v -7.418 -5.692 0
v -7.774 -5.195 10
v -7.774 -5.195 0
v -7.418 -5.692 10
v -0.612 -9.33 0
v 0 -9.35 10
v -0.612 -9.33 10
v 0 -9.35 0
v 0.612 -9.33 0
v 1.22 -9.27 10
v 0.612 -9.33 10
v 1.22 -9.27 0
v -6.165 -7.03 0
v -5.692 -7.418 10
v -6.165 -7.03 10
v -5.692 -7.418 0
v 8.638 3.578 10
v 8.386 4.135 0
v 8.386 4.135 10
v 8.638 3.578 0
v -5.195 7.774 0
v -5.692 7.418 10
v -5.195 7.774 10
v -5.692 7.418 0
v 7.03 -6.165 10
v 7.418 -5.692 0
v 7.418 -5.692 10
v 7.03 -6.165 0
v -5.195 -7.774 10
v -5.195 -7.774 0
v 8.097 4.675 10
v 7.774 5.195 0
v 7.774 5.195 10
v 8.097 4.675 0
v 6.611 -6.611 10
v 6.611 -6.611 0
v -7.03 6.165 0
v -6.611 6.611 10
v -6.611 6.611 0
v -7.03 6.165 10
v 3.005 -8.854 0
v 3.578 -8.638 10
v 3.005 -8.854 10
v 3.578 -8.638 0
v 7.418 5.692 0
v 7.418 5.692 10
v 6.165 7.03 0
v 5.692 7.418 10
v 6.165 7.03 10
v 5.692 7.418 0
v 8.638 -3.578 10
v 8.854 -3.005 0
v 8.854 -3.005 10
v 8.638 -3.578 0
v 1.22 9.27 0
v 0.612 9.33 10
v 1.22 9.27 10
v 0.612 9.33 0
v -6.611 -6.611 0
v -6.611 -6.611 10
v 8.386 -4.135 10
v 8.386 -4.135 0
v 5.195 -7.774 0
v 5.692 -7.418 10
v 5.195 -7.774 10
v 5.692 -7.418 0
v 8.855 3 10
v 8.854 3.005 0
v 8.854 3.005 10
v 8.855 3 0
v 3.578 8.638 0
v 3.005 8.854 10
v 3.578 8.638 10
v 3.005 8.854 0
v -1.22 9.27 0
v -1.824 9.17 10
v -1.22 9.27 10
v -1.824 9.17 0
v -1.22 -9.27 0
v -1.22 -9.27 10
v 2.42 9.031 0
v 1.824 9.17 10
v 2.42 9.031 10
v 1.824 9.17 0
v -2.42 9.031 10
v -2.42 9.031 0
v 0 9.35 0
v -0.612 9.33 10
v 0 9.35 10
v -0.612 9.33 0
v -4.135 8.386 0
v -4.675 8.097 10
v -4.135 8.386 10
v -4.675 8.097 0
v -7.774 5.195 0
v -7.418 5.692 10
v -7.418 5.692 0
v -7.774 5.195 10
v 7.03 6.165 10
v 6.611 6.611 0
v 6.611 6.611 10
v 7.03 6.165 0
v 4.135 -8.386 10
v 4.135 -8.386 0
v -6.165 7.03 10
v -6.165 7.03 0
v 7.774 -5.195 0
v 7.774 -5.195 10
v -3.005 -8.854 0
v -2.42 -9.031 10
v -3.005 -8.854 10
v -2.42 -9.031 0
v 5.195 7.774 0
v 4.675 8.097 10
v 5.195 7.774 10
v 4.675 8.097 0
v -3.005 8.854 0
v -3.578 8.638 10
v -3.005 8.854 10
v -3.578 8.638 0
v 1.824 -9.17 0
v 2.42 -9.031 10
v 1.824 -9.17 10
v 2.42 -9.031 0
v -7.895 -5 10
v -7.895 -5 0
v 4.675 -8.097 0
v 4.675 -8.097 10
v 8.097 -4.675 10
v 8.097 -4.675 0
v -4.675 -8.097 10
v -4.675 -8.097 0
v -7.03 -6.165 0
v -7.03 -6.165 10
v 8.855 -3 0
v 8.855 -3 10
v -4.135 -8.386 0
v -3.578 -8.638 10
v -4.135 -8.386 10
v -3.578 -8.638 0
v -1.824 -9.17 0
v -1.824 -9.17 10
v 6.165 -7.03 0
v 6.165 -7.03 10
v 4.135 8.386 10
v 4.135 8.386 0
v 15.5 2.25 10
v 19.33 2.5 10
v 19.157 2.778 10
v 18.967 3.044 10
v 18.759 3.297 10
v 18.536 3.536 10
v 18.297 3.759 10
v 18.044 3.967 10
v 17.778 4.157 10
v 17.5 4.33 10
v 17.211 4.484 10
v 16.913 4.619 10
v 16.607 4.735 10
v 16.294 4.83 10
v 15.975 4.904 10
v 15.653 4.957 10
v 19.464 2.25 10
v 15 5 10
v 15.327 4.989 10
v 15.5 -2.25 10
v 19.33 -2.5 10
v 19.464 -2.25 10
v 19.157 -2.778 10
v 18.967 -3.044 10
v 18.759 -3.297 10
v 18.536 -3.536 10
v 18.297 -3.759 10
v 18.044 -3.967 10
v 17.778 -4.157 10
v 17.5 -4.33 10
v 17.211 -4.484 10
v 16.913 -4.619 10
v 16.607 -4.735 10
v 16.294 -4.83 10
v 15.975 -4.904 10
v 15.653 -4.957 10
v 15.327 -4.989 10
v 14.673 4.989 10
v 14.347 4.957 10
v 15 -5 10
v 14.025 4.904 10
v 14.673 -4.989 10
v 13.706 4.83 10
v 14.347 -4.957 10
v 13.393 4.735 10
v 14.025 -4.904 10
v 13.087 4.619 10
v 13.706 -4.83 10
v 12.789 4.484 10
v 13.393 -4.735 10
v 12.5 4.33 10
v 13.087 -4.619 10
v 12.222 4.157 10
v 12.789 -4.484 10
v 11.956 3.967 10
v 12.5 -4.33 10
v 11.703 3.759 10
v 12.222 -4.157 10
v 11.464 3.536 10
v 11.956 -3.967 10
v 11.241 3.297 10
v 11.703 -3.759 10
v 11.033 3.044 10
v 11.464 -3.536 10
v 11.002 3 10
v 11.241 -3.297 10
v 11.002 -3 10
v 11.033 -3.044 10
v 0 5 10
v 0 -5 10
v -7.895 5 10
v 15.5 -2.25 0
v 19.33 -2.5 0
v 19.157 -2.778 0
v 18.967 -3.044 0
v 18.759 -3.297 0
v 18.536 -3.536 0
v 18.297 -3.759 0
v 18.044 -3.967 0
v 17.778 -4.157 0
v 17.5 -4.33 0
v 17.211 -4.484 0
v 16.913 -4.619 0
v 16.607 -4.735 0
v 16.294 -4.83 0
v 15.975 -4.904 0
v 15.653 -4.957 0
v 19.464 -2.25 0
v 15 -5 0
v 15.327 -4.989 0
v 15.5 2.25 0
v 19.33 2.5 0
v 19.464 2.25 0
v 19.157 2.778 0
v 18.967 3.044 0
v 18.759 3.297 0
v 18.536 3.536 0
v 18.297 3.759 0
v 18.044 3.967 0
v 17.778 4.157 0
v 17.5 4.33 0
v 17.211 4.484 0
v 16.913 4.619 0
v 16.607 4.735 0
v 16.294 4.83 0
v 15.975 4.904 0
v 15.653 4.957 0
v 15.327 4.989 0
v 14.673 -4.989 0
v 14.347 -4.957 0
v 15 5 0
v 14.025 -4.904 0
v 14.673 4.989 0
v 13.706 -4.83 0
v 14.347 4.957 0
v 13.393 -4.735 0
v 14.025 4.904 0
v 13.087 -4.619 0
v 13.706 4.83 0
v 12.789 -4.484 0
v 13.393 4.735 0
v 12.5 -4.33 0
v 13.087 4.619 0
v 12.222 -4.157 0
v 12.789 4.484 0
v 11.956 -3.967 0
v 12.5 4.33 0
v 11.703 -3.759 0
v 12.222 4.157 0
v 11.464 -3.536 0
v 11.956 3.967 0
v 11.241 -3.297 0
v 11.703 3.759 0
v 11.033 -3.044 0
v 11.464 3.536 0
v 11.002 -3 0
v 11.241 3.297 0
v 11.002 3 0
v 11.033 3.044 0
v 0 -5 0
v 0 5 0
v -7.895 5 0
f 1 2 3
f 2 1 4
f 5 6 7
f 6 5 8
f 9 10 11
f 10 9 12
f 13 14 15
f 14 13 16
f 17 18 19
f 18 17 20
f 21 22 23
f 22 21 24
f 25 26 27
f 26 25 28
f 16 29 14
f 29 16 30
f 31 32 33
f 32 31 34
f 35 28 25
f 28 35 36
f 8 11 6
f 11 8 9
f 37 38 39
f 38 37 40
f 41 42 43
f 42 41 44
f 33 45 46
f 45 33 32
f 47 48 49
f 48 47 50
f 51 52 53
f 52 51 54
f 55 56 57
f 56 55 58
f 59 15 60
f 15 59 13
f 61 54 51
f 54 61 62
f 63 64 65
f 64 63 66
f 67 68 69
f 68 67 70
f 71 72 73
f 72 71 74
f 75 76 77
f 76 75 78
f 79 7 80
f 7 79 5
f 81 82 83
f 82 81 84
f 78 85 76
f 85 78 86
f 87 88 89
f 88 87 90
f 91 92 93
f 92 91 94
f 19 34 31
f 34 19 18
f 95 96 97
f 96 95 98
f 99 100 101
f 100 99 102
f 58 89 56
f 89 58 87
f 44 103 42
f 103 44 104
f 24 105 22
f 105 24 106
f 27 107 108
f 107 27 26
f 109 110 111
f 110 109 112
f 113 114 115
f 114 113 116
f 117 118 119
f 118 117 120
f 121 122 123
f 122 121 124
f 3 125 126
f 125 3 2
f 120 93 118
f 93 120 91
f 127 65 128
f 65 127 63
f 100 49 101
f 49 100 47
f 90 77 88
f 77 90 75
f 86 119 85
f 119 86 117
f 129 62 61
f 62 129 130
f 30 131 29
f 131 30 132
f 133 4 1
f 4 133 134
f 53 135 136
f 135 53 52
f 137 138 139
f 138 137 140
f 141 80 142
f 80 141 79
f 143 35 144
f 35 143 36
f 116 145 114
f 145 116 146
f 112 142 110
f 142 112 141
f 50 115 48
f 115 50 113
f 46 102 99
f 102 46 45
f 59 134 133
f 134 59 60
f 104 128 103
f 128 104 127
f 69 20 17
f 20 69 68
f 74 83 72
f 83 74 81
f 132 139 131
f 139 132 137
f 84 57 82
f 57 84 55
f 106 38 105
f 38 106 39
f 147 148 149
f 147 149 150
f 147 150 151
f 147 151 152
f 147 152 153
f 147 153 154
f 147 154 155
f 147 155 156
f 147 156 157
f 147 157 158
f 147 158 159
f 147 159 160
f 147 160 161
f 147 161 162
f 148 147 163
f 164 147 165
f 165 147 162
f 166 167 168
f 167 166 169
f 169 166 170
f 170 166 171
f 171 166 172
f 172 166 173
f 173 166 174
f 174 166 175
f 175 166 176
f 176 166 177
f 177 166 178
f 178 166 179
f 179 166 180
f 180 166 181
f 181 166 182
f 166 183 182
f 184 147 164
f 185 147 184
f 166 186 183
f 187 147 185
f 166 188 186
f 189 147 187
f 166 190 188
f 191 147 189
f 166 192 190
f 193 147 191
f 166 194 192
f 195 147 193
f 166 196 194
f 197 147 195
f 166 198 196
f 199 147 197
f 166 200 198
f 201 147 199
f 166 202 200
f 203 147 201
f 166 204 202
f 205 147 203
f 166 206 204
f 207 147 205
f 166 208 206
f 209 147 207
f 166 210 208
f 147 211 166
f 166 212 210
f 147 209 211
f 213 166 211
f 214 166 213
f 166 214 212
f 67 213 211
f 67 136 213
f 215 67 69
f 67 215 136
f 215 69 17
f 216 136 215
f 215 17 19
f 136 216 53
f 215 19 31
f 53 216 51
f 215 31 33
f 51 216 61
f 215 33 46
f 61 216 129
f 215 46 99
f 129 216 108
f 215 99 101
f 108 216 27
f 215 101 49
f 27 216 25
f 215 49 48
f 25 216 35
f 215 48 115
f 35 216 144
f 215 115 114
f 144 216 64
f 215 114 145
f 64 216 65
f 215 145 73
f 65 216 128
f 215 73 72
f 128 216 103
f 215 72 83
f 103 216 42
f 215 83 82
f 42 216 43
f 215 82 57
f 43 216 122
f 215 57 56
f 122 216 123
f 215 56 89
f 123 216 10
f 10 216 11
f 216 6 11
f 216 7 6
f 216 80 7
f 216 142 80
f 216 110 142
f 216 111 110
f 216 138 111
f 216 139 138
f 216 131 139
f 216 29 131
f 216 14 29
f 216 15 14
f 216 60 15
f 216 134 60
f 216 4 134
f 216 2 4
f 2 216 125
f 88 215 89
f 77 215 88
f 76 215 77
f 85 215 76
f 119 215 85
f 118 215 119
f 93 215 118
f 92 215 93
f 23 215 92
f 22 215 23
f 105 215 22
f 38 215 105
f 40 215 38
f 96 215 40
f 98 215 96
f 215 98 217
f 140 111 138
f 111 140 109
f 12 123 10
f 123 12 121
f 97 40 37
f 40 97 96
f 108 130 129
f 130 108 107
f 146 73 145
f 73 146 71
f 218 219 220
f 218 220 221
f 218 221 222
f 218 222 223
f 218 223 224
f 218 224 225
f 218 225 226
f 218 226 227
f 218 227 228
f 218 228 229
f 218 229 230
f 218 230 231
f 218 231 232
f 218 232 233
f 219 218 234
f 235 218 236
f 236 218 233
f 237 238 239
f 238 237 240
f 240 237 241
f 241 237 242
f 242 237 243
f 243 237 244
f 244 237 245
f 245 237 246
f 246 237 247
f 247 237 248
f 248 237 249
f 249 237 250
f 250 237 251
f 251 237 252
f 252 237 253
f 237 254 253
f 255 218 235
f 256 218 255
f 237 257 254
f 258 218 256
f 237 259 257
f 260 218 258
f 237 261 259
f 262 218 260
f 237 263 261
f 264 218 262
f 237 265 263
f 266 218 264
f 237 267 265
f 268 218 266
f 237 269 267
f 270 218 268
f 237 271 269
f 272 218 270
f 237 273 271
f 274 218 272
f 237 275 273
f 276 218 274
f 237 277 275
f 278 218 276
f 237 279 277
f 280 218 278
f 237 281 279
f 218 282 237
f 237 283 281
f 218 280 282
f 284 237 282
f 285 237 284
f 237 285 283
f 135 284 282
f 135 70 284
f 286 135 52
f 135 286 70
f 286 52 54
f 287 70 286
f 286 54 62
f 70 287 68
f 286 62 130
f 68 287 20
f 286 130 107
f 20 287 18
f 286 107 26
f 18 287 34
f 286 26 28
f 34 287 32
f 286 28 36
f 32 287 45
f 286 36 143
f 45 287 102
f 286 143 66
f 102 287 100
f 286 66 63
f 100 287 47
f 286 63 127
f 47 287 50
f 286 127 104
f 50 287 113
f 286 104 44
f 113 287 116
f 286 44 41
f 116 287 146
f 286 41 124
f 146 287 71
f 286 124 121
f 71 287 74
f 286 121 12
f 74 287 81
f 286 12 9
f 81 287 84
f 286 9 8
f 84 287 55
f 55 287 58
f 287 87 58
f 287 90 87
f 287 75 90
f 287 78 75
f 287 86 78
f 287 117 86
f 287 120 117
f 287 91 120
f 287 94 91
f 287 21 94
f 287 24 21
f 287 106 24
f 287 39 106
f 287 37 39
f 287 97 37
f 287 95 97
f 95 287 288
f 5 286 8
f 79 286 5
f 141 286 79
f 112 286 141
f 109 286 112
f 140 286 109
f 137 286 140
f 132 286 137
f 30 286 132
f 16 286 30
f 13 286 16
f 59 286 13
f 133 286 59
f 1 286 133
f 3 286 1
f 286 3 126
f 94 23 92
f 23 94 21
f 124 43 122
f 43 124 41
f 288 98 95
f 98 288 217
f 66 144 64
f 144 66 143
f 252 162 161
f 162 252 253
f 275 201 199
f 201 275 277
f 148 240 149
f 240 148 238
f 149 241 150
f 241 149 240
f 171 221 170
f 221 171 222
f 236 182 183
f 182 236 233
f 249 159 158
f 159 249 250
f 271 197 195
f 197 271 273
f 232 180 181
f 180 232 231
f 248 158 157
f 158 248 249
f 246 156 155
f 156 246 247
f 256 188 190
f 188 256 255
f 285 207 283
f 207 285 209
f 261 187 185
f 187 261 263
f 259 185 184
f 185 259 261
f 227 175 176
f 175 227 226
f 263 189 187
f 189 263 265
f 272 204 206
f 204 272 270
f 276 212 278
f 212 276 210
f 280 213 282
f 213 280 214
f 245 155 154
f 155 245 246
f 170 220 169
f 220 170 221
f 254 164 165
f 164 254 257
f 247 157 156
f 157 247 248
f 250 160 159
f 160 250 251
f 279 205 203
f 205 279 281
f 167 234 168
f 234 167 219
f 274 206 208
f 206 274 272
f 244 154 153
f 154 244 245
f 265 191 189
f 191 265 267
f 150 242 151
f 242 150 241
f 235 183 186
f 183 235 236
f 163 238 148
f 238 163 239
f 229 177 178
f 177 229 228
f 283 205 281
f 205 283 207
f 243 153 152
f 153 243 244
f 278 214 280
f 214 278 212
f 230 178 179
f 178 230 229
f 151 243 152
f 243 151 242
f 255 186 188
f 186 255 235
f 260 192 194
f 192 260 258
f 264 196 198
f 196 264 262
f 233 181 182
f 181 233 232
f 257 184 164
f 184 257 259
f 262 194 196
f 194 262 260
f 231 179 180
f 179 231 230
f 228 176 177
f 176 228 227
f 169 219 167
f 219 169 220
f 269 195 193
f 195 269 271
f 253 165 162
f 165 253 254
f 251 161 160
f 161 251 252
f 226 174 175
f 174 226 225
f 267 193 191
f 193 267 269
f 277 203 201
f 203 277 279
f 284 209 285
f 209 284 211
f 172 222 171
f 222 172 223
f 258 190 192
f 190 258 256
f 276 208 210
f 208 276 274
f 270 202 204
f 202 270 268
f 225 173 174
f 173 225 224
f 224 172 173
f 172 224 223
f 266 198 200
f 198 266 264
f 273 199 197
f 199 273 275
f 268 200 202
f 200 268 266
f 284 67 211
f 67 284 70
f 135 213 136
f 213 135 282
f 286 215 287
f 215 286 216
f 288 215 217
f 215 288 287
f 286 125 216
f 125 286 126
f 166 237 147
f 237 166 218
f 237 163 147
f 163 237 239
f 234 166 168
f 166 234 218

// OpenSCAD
// Tubing clip for 12.7 mm lab stand rod
// Print orientation: flat on bed, extrusion along +Z

$fn = 96;

// ---- Dimensions (mm) ----
rod_d      = 12.7;   // rod diameter
ring_w     = 3;      // rod ring wall thickness
rod_r      = rod_d/2 + ring_w; // rod ring outer radius (18.7/2)
opening_w  = 10;     // rod ring opening width
rod_h      = 10;     // clip height

tub_d      = 6;      // tubing inner diameter
tub_w      = 2;      // tubing wall thickness
tub_r      = tub_d/2 + tub_w; // tubing outer radius
tub_x      = 15;     // tubing ring centre X
tub_open   = 4.5;    // tubing opening width
tub_h      = rod_h;  // tubing ring height

bridge_x1  = 8;      // bridge start X
bridge_x2  = 12;     // bridge end X
bridge_w   = 6;      // bridge width (Y)

eps        = 0.5;    // cut overshoot

// ---- Model ----
difference() {
    union() {
        // Rod ring
        cylinder(r = rod_r, h = rod_h);
        // Tubing ring
        translate([tub_x, 0, 0])
            cylinder(r = tub_r, h = tub_h);
        // Bridge
        translate([bridge_x1, -bridge_w/2, 0])
            cube([bridge_x2 - bridge_x1, bridge_w, rod_h]);
    }
    // Rod opening
    translate([-rod_r - eps, -opening_w/2, 0])
        cube([rod_r + eps, opening_w, rod_h]);
    // Tubing opening
    translate([tub_x + eps, -tub_open/2, 0])
        cube([rod_h + 2*eps, tub_open, rod_h]);
}
